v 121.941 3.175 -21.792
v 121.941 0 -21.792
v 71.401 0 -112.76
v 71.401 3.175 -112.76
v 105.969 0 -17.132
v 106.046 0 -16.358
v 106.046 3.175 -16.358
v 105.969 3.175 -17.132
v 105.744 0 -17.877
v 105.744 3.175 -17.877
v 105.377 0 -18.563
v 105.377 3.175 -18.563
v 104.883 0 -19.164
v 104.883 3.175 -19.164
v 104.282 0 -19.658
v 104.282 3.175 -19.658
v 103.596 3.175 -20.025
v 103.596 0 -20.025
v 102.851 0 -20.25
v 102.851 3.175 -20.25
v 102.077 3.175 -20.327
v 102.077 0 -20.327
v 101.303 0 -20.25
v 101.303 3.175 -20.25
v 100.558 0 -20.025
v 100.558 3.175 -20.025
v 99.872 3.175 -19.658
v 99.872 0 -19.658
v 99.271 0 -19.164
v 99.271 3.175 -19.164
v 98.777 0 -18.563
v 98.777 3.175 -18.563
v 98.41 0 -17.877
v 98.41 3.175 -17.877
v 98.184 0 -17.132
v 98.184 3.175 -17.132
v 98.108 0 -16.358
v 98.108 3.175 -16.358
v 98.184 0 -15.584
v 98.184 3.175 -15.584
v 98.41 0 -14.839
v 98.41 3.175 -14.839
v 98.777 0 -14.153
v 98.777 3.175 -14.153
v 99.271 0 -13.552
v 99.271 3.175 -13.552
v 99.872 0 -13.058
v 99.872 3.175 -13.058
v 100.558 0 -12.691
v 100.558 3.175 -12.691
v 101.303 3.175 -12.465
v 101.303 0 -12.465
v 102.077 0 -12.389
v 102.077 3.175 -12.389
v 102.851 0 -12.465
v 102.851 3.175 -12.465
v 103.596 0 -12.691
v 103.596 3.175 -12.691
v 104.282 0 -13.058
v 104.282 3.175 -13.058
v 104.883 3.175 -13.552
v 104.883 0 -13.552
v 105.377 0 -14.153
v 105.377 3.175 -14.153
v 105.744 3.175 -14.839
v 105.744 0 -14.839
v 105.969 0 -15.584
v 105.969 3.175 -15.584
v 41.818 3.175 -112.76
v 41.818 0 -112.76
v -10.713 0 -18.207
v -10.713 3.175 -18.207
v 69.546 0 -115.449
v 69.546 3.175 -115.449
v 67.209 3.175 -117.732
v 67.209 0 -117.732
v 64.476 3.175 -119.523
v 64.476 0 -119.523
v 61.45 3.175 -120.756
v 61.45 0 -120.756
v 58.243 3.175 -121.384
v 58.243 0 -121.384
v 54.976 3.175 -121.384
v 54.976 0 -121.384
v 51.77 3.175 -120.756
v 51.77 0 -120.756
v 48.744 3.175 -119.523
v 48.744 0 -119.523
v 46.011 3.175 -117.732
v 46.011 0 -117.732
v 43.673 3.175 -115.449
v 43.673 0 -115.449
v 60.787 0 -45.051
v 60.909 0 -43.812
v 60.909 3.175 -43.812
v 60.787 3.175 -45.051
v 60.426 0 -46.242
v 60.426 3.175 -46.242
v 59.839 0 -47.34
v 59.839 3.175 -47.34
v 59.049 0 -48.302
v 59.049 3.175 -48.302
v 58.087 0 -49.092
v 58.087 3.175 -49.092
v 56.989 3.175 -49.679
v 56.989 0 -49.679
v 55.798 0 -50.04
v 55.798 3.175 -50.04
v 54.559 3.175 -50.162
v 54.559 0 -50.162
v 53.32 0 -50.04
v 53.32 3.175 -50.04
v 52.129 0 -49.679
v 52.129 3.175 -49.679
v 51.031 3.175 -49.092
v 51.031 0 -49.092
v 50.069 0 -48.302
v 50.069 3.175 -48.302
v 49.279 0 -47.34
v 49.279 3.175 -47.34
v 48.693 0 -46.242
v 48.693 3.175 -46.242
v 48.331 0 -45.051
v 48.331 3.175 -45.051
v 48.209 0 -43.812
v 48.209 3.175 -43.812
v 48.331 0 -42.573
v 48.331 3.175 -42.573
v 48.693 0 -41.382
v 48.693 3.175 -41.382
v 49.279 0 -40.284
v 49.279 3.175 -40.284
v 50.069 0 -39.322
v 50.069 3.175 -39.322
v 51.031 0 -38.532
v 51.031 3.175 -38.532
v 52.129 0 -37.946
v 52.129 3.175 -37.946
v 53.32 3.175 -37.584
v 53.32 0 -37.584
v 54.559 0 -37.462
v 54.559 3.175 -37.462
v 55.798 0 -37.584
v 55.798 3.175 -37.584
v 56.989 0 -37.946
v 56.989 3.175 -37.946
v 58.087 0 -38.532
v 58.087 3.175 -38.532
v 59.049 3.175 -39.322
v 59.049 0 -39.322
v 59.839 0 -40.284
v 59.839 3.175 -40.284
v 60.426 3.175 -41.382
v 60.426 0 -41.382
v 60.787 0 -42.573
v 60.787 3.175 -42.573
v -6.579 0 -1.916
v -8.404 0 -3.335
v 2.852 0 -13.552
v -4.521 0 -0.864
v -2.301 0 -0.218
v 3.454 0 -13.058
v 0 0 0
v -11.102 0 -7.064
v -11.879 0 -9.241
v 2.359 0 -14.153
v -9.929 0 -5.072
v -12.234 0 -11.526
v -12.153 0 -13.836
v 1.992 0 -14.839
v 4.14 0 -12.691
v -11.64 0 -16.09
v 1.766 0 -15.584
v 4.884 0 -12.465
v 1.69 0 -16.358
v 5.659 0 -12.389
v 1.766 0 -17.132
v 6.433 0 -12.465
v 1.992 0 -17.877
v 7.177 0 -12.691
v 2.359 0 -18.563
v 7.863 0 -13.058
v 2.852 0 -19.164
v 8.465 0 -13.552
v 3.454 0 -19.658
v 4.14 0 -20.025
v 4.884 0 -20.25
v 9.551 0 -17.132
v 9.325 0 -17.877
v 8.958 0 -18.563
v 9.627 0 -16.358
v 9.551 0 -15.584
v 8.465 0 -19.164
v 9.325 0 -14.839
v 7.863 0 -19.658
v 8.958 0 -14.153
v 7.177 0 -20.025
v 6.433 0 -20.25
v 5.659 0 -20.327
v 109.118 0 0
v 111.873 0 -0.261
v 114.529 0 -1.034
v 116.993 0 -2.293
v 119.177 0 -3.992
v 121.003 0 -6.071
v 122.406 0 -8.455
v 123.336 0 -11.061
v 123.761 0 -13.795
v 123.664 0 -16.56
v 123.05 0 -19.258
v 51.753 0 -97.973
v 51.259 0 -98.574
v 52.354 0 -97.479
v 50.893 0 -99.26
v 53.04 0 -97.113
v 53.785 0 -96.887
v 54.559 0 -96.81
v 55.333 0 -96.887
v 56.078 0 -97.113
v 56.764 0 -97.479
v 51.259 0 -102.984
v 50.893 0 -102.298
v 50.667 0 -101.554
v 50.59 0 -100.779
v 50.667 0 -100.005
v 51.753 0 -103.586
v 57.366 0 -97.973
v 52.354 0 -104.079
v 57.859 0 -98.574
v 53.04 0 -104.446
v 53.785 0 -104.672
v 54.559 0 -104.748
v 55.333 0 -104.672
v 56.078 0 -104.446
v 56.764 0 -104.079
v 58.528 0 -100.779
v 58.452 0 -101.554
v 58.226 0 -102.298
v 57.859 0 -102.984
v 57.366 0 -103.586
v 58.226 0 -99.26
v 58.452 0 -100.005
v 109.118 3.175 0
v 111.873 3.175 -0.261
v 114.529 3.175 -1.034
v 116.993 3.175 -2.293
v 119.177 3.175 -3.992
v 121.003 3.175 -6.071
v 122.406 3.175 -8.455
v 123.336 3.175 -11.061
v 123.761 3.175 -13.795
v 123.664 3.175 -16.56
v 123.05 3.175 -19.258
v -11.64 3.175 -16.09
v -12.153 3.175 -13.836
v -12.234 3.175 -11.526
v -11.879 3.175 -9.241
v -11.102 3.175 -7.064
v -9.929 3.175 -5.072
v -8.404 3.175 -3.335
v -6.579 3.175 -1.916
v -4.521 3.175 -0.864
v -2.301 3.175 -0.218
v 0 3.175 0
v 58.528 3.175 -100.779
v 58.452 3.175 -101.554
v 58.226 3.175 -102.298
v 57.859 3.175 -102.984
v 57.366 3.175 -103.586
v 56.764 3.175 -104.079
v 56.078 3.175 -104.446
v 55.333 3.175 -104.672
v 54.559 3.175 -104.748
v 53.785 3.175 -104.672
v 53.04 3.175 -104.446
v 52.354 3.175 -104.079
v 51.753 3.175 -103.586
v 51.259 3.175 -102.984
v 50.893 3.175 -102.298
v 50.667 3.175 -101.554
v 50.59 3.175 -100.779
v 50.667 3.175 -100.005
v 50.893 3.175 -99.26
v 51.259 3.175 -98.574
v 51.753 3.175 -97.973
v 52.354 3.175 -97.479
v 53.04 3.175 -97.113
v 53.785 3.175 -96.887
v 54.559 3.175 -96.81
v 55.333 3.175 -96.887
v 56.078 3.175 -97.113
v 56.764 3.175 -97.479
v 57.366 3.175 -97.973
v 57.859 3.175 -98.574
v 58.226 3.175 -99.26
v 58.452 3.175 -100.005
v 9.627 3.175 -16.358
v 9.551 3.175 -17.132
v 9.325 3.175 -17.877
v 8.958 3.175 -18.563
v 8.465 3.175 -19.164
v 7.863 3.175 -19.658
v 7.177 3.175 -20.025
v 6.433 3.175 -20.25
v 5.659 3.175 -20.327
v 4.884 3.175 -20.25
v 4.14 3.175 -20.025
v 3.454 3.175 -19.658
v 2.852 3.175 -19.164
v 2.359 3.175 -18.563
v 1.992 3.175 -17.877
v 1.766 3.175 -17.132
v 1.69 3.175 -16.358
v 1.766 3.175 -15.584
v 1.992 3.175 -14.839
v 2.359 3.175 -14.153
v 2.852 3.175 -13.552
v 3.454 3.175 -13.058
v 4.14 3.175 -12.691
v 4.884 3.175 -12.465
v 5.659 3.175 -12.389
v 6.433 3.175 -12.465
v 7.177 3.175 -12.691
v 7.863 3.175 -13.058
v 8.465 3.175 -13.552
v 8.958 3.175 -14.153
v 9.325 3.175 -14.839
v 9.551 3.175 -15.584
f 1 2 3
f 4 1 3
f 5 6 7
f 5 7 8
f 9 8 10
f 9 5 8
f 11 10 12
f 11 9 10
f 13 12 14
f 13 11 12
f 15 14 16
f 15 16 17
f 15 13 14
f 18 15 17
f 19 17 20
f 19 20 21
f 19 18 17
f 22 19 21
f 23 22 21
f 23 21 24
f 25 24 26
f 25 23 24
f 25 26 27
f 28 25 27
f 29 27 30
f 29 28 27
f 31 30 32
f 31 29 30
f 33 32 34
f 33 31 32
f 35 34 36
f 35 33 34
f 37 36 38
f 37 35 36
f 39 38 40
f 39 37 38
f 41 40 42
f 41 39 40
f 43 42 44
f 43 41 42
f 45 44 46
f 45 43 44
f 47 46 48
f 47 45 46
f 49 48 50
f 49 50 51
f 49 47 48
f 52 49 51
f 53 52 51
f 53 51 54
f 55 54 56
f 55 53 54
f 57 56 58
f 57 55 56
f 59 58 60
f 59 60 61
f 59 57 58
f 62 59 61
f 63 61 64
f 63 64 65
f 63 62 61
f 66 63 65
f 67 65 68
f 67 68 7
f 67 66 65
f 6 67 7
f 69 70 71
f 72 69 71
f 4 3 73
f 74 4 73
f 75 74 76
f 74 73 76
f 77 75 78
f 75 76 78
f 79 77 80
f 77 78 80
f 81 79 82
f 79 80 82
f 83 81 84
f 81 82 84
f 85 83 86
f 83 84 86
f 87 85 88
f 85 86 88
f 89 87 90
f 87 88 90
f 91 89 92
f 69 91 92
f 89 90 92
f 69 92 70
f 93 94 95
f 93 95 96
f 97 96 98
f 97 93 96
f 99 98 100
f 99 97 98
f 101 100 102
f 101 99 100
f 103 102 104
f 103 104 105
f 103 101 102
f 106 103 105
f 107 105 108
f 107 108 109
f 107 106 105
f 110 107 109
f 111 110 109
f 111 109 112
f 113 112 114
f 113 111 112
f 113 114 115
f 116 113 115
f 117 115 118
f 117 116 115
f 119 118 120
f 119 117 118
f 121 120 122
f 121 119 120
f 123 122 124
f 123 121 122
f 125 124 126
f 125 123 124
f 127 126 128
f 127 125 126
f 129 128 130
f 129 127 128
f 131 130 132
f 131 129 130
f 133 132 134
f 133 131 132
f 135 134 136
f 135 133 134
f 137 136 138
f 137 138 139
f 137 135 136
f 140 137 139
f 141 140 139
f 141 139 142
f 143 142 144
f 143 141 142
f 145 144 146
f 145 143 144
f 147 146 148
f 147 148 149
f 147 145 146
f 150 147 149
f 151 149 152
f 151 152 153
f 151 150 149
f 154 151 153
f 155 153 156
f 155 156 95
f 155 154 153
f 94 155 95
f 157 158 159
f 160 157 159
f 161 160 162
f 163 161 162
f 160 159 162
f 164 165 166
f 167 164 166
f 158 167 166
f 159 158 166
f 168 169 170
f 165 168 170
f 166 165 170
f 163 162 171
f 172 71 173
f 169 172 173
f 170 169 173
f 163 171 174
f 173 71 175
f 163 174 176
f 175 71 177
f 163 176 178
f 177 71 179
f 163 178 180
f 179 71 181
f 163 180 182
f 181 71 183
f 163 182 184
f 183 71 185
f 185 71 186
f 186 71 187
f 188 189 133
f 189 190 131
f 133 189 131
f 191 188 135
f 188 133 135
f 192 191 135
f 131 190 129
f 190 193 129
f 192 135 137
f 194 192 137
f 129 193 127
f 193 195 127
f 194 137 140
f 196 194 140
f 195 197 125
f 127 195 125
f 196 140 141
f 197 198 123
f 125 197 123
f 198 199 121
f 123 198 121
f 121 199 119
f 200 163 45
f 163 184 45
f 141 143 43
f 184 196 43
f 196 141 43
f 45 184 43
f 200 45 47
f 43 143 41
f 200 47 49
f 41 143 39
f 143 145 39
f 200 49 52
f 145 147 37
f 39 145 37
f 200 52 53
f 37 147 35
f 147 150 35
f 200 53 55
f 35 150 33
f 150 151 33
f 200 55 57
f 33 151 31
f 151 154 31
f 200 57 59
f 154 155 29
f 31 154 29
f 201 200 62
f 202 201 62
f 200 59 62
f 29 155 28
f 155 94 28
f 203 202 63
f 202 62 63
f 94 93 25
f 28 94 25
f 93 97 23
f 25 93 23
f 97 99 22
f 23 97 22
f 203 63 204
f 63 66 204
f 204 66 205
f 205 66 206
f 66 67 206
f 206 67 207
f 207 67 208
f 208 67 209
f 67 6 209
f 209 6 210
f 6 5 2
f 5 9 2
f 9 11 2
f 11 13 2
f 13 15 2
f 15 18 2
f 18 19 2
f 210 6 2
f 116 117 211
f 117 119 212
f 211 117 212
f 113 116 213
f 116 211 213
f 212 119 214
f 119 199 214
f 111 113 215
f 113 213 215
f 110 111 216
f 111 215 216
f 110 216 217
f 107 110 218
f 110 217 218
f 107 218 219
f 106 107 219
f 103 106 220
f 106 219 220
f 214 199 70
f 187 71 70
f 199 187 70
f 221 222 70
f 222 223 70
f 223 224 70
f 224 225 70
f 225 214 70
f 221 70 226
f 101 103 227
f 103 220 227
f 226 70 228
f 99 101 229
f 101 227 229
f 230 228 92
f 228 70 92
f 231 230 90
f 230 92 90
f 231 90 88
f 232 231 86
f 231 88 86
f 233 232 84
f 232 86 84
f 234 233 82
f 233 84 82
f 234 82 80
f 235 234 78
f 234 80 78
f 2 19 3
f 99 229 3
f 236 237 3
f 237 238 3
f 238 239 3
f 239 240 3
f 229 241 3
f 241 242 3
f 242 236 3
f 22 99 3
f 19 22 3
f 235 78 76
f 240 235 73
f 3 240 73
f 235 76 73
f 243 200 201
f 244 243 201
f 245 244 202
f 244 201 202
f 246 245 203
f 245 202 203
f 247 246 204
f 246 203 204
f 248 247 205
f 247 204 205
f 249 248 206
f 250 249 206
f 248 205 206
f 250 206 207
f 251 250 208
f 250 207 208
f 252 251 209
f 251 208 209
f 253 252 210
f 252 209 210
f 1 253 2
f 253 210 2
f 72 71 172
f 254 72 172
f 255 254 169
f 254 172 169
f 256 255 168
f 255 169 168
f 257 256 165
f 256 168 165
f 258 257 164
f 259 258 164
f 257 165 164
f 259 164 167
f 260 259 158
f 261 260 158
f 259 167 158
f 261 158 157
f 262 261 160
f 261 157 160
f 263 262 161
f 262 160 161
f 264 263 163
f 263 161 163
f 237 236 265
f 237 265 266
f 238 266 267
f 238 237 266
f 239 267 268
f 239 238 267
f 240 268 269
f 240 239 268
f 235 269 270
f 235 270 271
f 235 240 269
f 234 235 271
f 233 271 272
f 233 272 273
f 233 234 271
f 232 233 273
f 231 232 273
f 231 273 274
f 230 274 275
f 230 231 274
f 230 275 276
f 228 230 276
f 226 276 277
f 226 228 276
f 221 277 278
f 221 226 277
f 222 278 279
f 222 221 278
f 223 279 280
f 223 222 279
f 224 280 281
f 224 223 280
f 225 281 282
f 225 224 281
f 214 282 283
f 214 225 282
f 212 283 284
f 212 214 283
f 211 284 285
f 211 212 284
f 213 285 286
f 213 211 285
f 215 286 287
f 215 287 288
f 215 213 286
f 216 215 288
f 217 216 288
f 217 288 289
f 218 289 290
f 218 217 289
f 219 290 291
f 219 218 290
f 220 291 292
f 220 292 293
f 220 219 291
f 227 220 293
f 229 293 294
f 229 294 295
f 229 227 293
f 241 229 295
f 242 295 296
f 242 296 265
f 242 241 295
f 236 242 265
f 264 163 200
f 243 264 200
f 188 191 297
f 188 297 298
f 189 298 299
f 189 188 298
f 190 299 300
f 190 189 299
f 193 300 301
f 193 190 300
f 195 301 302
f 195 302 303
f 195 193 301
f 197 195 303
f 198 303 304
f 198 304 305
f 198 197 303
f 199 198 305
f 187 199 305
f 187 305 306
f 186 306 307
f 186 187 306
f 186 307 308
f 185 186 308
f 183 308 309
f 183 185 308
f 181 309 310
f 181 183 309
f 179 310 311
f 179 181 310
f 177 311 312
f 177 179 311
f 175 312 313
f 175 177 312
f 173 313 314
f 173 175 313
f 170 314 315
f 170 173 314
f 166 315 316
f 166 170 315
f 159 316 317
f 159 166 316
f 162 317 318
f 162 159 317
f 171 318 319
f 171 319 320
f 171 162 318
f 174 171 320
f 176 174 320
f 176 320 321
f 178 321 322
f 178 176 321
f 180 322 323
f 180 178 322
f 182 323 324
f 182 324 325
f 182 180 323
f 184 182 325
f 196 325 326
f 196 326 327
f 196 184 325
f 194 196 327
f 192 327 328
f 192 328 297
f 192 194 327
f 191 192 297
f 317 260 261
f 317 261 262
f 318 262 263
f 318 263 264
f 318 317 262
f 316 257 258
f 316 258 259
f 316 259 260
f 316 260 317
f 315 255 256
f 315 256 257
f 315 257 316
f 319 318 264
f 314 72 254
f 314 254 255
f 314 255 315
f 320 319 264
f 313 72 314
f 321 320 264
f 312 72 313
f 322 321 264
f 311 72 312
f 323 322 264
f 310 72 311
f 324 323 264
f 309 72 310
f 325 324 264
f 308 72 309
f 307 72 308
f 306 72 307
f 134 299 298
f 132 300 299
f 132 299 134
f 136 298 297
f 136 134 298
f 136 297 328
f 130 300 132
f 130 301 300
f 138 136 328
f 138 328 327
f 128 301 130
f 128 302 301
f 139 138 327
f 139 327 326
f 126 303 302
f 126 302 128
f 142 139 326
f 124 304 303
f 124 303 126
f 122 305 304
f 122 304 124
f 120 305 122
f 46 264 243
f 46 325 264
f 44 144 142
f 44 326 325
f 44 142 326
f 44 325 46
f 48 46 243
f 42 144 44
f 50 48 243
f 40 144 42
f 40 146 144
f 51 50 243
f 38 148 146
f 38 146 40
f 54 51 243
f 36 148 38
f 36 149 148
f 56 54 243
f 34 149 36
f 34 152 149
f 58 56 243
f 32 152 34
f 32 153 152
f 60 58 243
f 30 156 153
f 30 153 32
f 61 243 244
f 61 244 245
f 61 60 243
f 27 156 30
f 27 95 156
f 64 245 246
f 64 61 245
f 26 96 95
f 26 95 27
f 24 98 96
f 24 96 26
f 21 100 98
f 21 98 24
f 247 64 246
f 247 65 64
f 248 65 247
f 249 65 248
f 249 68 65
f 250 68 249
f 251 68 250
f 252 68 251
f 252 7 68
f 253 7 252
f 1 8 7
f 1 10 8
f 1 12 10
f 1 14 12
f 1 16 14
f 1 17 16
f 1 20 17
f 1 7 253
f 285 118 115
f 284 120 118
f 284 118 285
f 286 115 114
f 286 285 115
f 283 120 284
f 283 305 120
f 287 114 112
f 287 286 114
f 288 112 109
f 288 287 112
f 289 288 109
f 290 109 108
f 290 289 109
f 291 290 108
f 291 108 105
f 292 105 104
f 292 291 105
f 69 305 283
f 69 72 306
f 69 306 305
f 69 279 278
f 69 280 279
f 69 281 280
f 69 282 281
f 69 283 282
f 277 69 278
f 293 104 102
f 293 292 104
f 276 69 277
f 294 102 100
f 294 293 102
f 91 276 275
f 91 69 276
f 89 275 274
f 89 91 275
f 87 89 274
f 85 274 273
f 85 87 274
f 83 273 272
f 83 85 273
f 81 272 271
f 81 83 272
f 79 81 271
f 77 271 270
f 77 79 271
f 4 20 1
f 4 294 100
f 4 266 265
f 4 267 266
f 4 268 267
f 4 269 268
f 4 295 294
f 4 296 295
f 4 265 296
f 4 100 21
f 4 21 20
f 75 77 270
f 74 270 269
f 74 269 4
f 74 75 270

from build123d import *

# Parameters (mm, degrees)
SKETCH1_R           = 3.96875
SKETCH1_R_2         = 6.35
BOSS_EXTRUDE1_DEPTH = 3.175


with BuildPart() as part:
    # Sketch1 → Boss-Extrude1 (new body)
    with BuildSketch(Plane(origin=(0, 0, 0), x_dir=(1, 0, 0), z_dir=(0, 1, 0))):
        with BuildLine():
            Line((0, 0), (109.1184, 0))
            ThreePointArc((109.1184, 0), (121.760823269, 7.229815564), (121.940842268, 21.792394057))
            Line((121.940842268, 21.792394057), (71.401285641, 112.759573229))
            ThreePointArc((71.401285641, 112.759573229), (56.609708232, 121.4628), (41.818130824, 112.759573229))
            Line((41.818130824, 112.759573229), (-10.713122761, 18.207498065))
            ThreePointArc((-10.713122761, 18.207498065), (-10.562717277, 6.040495255), (0, 0))
        make_face()
        with Locations((5.658509088, 16.357983524)):
            Circle(SKETCH1_R, mode=Mode.SUBTRACT)
        with Locations((102.076909088, 16.357983524)):
            Circle(SKETCH1_R, mode=Mode.SUBTRACT)
        with Locations((54.5592, 100.77924387)):
            Circle(SKETCH1_R, mode=Mode.SUBTRACT)
        with Locations((54.5592, 43.812190688)):
            Circle(SKETCH1_R_2, mode=Mode.SUBTRACT)
    extrude(amount=BOSS_EXTRUDE1_DEPTH)


solid = part.part
